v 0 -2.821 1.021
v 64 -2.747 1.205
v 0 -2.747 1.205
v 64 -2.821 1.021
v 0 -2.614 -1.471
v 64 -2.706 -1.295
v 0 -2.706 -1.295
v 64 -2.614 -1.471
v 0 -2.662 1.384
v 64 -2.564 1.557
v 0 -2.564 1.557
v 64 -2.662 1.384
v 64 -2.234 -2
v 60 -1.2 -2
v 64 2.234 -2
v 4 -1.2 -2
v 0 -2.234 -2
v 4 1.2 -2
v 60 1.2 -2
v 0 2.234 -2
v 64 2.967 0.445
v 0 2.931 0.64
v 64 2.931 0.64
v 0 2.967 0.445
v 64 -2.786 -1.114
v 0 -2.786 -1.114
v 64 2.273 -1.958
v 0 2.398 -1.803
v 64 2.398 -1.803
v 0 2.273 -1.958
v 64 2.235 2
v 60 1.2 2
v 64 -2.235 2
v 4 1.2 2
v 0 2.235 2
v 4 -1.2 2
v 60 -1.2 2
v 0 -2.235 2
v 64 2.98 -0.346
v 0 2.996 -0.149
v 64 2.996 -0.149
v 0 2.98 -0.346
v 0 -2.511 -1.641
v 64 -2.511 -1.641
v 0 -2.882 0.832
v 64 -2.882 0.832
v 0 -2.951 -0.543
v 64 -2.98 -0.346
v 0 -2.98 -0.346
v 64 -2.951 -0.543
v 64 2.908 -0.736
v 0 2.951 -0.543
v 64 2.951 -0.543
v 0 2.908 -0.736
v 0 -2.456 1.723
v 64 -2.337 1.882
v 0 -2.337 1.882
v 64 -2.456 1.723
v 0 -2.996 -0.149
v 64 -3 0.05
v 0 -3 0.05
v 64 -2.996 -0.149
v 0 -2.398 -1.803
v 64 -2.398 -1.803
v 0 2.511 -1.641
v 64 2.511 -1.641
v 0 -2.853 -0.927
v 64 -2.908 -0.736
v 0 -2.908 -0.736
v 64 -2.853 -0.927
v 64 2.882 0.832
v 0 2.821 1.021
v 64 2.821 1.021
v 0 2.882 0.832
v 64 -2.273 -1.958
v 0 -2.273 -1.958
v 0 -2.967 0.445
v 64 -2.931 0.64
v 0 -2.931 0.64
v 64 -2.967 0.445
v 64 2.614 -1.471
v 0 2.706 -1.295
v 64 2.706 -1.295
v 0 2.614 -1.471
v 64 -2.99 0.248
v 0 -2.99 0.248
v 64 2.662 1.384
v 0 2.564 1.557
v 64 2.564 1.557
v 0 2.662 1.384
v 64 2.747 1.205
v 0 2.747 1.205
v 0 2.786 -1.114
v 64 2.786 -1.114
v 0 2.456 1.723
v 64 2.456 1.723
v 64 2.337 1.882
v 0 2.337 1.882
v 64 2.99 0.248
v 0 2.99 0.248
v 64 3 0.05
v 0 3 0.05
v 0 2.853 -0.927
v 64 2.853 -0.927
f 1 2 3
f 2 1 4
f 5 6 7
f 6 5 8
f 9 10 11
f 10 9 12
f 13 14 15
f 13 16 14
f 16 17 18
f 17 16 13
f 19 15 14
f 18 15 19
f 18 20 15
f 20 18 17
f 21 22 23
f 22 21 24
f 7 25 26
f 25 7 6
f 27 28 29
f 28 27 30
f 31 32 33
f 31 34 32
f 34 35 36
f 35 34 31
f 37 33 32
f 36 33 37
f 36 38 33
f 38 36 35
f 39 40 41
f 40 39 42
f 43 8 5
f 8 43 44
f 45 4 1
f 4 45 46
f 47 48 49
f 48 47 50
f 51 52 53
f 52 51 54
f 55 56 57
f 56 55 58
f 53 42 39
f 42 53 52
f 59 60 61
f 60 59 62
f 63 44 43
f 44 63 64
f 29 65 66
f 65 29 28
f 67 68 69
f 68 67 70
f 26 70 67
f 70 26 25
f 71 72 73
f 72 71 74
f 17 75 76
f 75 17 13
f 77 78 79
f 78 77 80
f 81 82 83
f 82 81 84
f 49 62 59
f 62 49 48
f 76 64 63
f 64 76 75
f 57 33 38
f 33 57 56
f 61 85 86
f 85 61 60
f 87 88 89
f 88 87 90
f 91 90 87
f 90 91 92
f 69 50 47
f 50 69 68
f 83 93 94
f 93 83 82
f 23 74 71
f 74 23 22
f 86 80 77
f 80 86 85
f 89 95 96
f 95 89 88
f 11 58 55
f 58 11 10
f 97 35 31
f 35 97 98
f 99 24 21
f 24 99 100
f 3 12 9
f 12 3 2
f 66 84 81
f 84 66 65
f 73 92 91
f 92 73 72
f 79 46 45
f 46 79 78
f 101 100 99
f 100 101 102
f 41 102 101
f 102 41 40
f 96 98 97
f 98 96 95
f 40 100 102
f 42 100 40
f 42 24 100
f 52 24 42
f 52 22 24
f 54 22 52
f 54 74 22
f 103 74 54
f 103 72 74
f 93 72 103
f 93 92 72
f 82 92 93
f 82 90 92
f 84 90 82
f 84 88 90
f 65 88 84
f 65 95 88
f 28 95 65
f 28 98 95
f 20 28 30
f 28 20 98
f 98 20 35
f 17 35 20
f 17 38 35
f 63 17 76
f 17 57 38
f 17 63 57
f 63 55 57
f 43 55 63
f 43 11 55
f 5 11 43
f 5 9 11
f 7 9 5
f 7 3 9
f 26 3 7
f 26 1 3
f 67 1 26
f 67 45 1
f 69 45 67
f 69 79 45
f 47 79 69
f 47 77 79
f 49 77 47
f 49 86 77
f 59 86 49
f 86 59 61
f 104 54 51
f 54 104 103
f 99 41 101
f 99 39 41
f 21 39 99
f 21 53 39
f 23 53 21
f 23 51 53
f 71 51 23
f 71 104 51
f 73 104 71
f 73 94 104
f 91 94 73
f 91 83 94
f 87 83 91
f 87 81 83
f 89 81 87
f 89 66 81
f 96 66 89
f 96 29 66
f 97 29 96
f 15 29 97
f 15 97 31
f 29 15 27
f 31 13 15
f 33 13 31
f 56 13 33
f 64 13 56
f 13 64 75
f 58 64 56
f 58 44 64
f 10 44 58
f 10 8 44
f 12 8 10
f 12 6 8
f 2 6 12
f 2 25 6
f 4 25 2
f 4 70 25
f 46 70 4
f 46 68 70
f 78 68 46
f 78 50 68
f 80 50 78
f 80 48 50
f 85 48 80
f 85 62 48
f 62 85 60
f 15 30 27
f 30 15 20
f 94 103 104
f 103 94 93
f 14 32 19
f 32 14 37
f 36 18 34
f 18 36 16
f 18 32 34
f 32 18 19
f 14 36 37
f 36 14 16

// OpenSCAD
$fa = 0.2;
$fs = 0.2;

tolerance = 0.2;
xy_thickness = 0.48*3;
z_thickness = 0.2*10;

spool_dia = 57;
spool_length = 54;
spool_hole = 21;

holder_length = 60;
holder_leg_length = 50;
holder_solder_length = 40;
holder_width = 10;

pillar_d = 6;
pillar_s = 4;
solder_d = 2.4;

module pillar_shape() {
    intersection() {
        circle(d = pillar_d);
        square([pillar_s, pillar_d], center=true);
    }
}

module ring_shape(d, t) {
    difference() {
        circle(d = d);
        circle(d = d - t*2);
    }
}

module ring(d, t, h) {
    linear_extrude(h)
    ring_shape(d, t);
}

module spool() {
    ring(spool_dia, (spool_dia - spool_hole)/2, spool_length);
}

module holder_pillar() {
    linear_extrude(holder_length + z_thickness*2)
    pillar_shape();
}

module solder_pillar() {
    difference() {
        holder_pillar();
        translate([-pillar_d/2, -solder_d/2, z_thickness*2])
            cube([pillar_d, solder_d, holder_length - z_thickness * 2]);
    }
}

module pillar_placement() {
    children(0);
        
    rotate(-45)
    translate([holder_leg_length,0,0])
    rotate(90)
    children(0);
    
    rotate(-135)
    translate([holder_leg_length,0,0])
    rotate(90)
    children(0);
    
    rotate(135)
    translate([holder_solder_length,0,0])
    rotate(-135)
    children(1);
    
}


module holder_hull(angle, length = holder_leg_length) {
    hull() {
        circle(d = holder_width);
        rotate(angle)
        translate([0,length])
        circle(d = holder_width);
    }
}

module holder_base() {
    linear_extrude(z_thickness)
    difference() {
        union() {
            holder_hull(-135);
            holder_hull(45, holder_solder_length);
            holder_hull(135);
        }
        offset(tolerance)
        pillar_placement() {
            pillar_shape();
            pillar_shape();
        }
    }
   
}

module holder_pillars() {
    pillar_placement() {
        holder_pillar();
        solder_pillar();
    }
}


rotate([0,90,0])
solder_pillar();

//holder_base();

//holder_pillars();

*translate([0,0, z_thickness*2 + holder_length])
mirror([0,0,-1])
holder_base();


*translate([0,(pillar_d-spool_hole)/2,z_thickness + (holder_length-spool_length)/2])
#spool();
